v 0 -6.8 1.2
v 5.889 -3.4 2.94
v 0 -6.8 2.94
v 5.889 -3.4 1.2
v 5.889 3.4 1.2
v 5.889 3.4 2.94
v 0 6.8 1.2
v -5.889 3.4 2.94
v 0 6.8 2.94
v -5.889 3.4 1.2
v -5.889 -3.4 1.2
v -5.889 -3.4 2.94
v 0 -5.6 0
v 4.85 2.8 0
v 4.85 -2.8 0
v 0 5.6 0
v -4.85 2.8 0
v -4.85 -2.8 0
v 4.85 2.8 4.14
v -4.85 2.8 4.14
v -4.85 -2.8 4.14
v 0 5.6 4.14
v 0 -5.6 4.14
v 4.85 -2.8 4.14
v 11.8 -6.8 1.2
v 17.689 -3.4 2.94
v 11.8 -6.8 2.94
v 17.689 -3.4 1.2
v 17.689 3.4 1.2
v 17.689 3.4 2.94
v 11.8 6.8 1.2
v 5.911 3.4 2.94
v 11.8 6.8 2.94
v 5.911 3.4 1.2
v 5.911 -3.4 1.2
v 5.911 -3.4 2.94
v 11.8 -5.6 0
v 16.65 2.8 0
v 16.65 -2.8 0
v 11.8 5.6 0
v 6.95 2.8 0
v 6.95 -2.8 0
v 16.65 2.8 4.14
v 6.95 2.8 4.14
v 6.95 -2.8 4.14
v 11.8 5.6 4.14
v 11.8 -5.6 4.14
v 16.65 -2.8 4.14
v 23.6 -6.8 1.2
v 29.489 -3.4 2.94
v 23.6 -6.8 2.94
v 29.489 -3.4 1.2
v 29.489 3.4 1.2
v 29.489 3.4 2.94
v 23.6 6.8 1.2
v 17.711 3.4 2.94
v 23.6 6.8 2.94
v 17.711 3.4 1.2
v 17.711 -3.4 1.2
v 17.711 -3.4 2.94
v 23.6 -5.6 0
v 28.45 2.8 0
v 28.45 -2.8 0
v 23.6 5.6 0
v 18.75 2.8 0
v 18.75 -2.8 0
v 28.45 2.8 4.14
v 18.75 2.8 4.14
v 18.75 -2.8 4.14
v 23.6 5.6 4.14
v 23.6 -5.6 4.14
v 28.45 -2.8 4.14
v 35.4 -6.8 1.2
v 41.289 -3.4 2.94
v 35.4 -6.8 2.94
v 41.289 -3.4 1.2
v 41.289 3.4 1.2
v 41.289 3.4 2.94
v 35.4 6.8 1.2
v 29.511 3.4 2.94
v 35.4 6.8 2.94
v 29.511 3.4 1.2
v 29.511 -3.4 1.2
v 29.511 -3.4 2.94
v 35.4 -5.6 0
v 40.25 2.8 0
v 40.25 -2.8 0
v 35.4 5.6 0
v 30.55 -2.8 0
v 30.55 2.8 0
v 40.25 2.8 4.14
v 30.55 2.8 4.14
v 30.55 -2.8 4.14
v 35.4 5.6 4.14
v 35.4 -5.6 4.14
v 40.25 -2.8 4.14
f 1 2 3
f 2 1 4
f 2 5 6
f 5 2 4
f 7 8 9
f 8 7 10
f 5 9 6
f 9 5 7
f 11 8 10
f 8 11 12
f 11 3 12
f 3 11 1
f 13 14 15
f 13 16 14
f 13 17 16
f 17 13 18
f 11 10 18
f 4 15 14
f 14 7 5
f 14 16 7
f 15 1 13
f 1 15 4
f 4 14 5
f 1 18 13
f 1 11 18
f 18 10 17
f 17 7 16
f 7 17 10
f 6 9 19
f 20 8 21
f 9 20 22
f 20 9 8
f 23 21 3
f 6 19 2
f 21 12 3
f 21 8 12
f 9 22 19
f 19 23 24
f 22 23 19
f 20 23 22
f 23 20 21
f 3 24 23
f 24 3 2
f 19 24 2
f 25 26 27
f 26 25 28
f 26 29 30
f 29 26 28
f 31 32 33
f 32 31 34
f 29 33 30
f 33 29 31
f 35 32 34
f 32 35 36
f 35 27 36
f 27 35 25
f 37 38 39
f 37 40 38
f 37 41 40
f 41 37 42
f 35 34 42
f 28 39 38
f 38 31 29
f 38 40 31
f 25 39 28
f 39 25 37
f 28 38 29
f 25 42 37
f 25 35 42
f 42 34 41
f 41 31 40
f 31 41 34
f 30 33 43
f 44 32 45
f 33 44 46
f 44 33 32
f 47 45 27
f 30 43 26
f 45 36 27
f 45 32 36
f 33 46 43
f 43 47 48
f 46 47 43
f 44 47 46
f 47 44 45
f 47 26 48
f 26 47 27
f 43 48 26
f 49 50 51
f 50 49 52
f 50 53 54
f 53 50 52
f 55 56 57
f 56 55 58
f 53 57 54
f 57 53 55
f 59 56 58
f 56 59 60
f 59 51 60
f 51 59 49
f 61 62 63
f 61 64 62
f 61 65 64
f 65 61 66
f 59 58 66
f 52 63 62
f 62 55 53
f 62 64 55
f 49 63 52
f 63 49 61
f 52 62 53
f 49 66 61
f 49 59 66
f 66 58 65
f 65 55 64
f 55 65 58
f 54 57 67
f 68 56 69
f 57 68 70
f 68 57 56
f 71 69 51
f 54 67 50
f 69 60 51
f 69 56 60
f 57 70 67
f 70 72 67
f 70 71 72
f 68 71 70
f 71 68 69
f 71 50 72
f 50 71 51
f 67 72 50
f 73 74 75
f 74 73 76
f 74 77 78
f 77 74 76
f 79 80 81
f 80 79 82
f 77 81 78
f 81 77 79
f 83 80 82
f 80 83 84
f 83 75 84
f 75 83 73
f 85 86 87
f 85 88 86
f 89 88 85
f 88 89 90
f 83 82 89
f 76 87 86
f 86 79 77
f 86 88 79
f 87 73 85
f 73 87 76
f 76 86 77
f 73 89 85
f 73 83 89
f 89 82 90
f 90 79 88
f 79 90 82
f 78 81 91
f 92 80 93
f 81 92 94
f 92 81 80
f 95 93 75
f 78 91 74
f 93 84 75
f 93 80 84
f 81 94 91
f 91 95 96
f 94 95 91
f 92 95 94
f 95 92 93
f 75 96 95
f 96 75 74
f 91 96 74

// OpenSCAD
diameter=13.6;
height=4.14;
slope=1.2;

translate=11.8;



hexagon(diameter, height, slope);
translate([translate,0,0]) hexagon(diameter, height, slope);
translate([translate*2,0,0]) hexagon(diameter, height, slope);
translate([translate*3,0,0]) hexagon(diameter, height, slope);


module hexagon(diameter, height, slope=0) {

  rotate([0,0,30]) union() {
    translate([0,0,slope]) cylinder(d=diameter, h=height-slope*2, $fn=6);
    cylinder(d2=diameter, d1=diameter-slope*2, h=slope, $fn=6);
    translate([0,0,height-slope]) cylinder(d1=diameter, d2=diameter-slope*2, h=slope, $fn=6);
  }
}
